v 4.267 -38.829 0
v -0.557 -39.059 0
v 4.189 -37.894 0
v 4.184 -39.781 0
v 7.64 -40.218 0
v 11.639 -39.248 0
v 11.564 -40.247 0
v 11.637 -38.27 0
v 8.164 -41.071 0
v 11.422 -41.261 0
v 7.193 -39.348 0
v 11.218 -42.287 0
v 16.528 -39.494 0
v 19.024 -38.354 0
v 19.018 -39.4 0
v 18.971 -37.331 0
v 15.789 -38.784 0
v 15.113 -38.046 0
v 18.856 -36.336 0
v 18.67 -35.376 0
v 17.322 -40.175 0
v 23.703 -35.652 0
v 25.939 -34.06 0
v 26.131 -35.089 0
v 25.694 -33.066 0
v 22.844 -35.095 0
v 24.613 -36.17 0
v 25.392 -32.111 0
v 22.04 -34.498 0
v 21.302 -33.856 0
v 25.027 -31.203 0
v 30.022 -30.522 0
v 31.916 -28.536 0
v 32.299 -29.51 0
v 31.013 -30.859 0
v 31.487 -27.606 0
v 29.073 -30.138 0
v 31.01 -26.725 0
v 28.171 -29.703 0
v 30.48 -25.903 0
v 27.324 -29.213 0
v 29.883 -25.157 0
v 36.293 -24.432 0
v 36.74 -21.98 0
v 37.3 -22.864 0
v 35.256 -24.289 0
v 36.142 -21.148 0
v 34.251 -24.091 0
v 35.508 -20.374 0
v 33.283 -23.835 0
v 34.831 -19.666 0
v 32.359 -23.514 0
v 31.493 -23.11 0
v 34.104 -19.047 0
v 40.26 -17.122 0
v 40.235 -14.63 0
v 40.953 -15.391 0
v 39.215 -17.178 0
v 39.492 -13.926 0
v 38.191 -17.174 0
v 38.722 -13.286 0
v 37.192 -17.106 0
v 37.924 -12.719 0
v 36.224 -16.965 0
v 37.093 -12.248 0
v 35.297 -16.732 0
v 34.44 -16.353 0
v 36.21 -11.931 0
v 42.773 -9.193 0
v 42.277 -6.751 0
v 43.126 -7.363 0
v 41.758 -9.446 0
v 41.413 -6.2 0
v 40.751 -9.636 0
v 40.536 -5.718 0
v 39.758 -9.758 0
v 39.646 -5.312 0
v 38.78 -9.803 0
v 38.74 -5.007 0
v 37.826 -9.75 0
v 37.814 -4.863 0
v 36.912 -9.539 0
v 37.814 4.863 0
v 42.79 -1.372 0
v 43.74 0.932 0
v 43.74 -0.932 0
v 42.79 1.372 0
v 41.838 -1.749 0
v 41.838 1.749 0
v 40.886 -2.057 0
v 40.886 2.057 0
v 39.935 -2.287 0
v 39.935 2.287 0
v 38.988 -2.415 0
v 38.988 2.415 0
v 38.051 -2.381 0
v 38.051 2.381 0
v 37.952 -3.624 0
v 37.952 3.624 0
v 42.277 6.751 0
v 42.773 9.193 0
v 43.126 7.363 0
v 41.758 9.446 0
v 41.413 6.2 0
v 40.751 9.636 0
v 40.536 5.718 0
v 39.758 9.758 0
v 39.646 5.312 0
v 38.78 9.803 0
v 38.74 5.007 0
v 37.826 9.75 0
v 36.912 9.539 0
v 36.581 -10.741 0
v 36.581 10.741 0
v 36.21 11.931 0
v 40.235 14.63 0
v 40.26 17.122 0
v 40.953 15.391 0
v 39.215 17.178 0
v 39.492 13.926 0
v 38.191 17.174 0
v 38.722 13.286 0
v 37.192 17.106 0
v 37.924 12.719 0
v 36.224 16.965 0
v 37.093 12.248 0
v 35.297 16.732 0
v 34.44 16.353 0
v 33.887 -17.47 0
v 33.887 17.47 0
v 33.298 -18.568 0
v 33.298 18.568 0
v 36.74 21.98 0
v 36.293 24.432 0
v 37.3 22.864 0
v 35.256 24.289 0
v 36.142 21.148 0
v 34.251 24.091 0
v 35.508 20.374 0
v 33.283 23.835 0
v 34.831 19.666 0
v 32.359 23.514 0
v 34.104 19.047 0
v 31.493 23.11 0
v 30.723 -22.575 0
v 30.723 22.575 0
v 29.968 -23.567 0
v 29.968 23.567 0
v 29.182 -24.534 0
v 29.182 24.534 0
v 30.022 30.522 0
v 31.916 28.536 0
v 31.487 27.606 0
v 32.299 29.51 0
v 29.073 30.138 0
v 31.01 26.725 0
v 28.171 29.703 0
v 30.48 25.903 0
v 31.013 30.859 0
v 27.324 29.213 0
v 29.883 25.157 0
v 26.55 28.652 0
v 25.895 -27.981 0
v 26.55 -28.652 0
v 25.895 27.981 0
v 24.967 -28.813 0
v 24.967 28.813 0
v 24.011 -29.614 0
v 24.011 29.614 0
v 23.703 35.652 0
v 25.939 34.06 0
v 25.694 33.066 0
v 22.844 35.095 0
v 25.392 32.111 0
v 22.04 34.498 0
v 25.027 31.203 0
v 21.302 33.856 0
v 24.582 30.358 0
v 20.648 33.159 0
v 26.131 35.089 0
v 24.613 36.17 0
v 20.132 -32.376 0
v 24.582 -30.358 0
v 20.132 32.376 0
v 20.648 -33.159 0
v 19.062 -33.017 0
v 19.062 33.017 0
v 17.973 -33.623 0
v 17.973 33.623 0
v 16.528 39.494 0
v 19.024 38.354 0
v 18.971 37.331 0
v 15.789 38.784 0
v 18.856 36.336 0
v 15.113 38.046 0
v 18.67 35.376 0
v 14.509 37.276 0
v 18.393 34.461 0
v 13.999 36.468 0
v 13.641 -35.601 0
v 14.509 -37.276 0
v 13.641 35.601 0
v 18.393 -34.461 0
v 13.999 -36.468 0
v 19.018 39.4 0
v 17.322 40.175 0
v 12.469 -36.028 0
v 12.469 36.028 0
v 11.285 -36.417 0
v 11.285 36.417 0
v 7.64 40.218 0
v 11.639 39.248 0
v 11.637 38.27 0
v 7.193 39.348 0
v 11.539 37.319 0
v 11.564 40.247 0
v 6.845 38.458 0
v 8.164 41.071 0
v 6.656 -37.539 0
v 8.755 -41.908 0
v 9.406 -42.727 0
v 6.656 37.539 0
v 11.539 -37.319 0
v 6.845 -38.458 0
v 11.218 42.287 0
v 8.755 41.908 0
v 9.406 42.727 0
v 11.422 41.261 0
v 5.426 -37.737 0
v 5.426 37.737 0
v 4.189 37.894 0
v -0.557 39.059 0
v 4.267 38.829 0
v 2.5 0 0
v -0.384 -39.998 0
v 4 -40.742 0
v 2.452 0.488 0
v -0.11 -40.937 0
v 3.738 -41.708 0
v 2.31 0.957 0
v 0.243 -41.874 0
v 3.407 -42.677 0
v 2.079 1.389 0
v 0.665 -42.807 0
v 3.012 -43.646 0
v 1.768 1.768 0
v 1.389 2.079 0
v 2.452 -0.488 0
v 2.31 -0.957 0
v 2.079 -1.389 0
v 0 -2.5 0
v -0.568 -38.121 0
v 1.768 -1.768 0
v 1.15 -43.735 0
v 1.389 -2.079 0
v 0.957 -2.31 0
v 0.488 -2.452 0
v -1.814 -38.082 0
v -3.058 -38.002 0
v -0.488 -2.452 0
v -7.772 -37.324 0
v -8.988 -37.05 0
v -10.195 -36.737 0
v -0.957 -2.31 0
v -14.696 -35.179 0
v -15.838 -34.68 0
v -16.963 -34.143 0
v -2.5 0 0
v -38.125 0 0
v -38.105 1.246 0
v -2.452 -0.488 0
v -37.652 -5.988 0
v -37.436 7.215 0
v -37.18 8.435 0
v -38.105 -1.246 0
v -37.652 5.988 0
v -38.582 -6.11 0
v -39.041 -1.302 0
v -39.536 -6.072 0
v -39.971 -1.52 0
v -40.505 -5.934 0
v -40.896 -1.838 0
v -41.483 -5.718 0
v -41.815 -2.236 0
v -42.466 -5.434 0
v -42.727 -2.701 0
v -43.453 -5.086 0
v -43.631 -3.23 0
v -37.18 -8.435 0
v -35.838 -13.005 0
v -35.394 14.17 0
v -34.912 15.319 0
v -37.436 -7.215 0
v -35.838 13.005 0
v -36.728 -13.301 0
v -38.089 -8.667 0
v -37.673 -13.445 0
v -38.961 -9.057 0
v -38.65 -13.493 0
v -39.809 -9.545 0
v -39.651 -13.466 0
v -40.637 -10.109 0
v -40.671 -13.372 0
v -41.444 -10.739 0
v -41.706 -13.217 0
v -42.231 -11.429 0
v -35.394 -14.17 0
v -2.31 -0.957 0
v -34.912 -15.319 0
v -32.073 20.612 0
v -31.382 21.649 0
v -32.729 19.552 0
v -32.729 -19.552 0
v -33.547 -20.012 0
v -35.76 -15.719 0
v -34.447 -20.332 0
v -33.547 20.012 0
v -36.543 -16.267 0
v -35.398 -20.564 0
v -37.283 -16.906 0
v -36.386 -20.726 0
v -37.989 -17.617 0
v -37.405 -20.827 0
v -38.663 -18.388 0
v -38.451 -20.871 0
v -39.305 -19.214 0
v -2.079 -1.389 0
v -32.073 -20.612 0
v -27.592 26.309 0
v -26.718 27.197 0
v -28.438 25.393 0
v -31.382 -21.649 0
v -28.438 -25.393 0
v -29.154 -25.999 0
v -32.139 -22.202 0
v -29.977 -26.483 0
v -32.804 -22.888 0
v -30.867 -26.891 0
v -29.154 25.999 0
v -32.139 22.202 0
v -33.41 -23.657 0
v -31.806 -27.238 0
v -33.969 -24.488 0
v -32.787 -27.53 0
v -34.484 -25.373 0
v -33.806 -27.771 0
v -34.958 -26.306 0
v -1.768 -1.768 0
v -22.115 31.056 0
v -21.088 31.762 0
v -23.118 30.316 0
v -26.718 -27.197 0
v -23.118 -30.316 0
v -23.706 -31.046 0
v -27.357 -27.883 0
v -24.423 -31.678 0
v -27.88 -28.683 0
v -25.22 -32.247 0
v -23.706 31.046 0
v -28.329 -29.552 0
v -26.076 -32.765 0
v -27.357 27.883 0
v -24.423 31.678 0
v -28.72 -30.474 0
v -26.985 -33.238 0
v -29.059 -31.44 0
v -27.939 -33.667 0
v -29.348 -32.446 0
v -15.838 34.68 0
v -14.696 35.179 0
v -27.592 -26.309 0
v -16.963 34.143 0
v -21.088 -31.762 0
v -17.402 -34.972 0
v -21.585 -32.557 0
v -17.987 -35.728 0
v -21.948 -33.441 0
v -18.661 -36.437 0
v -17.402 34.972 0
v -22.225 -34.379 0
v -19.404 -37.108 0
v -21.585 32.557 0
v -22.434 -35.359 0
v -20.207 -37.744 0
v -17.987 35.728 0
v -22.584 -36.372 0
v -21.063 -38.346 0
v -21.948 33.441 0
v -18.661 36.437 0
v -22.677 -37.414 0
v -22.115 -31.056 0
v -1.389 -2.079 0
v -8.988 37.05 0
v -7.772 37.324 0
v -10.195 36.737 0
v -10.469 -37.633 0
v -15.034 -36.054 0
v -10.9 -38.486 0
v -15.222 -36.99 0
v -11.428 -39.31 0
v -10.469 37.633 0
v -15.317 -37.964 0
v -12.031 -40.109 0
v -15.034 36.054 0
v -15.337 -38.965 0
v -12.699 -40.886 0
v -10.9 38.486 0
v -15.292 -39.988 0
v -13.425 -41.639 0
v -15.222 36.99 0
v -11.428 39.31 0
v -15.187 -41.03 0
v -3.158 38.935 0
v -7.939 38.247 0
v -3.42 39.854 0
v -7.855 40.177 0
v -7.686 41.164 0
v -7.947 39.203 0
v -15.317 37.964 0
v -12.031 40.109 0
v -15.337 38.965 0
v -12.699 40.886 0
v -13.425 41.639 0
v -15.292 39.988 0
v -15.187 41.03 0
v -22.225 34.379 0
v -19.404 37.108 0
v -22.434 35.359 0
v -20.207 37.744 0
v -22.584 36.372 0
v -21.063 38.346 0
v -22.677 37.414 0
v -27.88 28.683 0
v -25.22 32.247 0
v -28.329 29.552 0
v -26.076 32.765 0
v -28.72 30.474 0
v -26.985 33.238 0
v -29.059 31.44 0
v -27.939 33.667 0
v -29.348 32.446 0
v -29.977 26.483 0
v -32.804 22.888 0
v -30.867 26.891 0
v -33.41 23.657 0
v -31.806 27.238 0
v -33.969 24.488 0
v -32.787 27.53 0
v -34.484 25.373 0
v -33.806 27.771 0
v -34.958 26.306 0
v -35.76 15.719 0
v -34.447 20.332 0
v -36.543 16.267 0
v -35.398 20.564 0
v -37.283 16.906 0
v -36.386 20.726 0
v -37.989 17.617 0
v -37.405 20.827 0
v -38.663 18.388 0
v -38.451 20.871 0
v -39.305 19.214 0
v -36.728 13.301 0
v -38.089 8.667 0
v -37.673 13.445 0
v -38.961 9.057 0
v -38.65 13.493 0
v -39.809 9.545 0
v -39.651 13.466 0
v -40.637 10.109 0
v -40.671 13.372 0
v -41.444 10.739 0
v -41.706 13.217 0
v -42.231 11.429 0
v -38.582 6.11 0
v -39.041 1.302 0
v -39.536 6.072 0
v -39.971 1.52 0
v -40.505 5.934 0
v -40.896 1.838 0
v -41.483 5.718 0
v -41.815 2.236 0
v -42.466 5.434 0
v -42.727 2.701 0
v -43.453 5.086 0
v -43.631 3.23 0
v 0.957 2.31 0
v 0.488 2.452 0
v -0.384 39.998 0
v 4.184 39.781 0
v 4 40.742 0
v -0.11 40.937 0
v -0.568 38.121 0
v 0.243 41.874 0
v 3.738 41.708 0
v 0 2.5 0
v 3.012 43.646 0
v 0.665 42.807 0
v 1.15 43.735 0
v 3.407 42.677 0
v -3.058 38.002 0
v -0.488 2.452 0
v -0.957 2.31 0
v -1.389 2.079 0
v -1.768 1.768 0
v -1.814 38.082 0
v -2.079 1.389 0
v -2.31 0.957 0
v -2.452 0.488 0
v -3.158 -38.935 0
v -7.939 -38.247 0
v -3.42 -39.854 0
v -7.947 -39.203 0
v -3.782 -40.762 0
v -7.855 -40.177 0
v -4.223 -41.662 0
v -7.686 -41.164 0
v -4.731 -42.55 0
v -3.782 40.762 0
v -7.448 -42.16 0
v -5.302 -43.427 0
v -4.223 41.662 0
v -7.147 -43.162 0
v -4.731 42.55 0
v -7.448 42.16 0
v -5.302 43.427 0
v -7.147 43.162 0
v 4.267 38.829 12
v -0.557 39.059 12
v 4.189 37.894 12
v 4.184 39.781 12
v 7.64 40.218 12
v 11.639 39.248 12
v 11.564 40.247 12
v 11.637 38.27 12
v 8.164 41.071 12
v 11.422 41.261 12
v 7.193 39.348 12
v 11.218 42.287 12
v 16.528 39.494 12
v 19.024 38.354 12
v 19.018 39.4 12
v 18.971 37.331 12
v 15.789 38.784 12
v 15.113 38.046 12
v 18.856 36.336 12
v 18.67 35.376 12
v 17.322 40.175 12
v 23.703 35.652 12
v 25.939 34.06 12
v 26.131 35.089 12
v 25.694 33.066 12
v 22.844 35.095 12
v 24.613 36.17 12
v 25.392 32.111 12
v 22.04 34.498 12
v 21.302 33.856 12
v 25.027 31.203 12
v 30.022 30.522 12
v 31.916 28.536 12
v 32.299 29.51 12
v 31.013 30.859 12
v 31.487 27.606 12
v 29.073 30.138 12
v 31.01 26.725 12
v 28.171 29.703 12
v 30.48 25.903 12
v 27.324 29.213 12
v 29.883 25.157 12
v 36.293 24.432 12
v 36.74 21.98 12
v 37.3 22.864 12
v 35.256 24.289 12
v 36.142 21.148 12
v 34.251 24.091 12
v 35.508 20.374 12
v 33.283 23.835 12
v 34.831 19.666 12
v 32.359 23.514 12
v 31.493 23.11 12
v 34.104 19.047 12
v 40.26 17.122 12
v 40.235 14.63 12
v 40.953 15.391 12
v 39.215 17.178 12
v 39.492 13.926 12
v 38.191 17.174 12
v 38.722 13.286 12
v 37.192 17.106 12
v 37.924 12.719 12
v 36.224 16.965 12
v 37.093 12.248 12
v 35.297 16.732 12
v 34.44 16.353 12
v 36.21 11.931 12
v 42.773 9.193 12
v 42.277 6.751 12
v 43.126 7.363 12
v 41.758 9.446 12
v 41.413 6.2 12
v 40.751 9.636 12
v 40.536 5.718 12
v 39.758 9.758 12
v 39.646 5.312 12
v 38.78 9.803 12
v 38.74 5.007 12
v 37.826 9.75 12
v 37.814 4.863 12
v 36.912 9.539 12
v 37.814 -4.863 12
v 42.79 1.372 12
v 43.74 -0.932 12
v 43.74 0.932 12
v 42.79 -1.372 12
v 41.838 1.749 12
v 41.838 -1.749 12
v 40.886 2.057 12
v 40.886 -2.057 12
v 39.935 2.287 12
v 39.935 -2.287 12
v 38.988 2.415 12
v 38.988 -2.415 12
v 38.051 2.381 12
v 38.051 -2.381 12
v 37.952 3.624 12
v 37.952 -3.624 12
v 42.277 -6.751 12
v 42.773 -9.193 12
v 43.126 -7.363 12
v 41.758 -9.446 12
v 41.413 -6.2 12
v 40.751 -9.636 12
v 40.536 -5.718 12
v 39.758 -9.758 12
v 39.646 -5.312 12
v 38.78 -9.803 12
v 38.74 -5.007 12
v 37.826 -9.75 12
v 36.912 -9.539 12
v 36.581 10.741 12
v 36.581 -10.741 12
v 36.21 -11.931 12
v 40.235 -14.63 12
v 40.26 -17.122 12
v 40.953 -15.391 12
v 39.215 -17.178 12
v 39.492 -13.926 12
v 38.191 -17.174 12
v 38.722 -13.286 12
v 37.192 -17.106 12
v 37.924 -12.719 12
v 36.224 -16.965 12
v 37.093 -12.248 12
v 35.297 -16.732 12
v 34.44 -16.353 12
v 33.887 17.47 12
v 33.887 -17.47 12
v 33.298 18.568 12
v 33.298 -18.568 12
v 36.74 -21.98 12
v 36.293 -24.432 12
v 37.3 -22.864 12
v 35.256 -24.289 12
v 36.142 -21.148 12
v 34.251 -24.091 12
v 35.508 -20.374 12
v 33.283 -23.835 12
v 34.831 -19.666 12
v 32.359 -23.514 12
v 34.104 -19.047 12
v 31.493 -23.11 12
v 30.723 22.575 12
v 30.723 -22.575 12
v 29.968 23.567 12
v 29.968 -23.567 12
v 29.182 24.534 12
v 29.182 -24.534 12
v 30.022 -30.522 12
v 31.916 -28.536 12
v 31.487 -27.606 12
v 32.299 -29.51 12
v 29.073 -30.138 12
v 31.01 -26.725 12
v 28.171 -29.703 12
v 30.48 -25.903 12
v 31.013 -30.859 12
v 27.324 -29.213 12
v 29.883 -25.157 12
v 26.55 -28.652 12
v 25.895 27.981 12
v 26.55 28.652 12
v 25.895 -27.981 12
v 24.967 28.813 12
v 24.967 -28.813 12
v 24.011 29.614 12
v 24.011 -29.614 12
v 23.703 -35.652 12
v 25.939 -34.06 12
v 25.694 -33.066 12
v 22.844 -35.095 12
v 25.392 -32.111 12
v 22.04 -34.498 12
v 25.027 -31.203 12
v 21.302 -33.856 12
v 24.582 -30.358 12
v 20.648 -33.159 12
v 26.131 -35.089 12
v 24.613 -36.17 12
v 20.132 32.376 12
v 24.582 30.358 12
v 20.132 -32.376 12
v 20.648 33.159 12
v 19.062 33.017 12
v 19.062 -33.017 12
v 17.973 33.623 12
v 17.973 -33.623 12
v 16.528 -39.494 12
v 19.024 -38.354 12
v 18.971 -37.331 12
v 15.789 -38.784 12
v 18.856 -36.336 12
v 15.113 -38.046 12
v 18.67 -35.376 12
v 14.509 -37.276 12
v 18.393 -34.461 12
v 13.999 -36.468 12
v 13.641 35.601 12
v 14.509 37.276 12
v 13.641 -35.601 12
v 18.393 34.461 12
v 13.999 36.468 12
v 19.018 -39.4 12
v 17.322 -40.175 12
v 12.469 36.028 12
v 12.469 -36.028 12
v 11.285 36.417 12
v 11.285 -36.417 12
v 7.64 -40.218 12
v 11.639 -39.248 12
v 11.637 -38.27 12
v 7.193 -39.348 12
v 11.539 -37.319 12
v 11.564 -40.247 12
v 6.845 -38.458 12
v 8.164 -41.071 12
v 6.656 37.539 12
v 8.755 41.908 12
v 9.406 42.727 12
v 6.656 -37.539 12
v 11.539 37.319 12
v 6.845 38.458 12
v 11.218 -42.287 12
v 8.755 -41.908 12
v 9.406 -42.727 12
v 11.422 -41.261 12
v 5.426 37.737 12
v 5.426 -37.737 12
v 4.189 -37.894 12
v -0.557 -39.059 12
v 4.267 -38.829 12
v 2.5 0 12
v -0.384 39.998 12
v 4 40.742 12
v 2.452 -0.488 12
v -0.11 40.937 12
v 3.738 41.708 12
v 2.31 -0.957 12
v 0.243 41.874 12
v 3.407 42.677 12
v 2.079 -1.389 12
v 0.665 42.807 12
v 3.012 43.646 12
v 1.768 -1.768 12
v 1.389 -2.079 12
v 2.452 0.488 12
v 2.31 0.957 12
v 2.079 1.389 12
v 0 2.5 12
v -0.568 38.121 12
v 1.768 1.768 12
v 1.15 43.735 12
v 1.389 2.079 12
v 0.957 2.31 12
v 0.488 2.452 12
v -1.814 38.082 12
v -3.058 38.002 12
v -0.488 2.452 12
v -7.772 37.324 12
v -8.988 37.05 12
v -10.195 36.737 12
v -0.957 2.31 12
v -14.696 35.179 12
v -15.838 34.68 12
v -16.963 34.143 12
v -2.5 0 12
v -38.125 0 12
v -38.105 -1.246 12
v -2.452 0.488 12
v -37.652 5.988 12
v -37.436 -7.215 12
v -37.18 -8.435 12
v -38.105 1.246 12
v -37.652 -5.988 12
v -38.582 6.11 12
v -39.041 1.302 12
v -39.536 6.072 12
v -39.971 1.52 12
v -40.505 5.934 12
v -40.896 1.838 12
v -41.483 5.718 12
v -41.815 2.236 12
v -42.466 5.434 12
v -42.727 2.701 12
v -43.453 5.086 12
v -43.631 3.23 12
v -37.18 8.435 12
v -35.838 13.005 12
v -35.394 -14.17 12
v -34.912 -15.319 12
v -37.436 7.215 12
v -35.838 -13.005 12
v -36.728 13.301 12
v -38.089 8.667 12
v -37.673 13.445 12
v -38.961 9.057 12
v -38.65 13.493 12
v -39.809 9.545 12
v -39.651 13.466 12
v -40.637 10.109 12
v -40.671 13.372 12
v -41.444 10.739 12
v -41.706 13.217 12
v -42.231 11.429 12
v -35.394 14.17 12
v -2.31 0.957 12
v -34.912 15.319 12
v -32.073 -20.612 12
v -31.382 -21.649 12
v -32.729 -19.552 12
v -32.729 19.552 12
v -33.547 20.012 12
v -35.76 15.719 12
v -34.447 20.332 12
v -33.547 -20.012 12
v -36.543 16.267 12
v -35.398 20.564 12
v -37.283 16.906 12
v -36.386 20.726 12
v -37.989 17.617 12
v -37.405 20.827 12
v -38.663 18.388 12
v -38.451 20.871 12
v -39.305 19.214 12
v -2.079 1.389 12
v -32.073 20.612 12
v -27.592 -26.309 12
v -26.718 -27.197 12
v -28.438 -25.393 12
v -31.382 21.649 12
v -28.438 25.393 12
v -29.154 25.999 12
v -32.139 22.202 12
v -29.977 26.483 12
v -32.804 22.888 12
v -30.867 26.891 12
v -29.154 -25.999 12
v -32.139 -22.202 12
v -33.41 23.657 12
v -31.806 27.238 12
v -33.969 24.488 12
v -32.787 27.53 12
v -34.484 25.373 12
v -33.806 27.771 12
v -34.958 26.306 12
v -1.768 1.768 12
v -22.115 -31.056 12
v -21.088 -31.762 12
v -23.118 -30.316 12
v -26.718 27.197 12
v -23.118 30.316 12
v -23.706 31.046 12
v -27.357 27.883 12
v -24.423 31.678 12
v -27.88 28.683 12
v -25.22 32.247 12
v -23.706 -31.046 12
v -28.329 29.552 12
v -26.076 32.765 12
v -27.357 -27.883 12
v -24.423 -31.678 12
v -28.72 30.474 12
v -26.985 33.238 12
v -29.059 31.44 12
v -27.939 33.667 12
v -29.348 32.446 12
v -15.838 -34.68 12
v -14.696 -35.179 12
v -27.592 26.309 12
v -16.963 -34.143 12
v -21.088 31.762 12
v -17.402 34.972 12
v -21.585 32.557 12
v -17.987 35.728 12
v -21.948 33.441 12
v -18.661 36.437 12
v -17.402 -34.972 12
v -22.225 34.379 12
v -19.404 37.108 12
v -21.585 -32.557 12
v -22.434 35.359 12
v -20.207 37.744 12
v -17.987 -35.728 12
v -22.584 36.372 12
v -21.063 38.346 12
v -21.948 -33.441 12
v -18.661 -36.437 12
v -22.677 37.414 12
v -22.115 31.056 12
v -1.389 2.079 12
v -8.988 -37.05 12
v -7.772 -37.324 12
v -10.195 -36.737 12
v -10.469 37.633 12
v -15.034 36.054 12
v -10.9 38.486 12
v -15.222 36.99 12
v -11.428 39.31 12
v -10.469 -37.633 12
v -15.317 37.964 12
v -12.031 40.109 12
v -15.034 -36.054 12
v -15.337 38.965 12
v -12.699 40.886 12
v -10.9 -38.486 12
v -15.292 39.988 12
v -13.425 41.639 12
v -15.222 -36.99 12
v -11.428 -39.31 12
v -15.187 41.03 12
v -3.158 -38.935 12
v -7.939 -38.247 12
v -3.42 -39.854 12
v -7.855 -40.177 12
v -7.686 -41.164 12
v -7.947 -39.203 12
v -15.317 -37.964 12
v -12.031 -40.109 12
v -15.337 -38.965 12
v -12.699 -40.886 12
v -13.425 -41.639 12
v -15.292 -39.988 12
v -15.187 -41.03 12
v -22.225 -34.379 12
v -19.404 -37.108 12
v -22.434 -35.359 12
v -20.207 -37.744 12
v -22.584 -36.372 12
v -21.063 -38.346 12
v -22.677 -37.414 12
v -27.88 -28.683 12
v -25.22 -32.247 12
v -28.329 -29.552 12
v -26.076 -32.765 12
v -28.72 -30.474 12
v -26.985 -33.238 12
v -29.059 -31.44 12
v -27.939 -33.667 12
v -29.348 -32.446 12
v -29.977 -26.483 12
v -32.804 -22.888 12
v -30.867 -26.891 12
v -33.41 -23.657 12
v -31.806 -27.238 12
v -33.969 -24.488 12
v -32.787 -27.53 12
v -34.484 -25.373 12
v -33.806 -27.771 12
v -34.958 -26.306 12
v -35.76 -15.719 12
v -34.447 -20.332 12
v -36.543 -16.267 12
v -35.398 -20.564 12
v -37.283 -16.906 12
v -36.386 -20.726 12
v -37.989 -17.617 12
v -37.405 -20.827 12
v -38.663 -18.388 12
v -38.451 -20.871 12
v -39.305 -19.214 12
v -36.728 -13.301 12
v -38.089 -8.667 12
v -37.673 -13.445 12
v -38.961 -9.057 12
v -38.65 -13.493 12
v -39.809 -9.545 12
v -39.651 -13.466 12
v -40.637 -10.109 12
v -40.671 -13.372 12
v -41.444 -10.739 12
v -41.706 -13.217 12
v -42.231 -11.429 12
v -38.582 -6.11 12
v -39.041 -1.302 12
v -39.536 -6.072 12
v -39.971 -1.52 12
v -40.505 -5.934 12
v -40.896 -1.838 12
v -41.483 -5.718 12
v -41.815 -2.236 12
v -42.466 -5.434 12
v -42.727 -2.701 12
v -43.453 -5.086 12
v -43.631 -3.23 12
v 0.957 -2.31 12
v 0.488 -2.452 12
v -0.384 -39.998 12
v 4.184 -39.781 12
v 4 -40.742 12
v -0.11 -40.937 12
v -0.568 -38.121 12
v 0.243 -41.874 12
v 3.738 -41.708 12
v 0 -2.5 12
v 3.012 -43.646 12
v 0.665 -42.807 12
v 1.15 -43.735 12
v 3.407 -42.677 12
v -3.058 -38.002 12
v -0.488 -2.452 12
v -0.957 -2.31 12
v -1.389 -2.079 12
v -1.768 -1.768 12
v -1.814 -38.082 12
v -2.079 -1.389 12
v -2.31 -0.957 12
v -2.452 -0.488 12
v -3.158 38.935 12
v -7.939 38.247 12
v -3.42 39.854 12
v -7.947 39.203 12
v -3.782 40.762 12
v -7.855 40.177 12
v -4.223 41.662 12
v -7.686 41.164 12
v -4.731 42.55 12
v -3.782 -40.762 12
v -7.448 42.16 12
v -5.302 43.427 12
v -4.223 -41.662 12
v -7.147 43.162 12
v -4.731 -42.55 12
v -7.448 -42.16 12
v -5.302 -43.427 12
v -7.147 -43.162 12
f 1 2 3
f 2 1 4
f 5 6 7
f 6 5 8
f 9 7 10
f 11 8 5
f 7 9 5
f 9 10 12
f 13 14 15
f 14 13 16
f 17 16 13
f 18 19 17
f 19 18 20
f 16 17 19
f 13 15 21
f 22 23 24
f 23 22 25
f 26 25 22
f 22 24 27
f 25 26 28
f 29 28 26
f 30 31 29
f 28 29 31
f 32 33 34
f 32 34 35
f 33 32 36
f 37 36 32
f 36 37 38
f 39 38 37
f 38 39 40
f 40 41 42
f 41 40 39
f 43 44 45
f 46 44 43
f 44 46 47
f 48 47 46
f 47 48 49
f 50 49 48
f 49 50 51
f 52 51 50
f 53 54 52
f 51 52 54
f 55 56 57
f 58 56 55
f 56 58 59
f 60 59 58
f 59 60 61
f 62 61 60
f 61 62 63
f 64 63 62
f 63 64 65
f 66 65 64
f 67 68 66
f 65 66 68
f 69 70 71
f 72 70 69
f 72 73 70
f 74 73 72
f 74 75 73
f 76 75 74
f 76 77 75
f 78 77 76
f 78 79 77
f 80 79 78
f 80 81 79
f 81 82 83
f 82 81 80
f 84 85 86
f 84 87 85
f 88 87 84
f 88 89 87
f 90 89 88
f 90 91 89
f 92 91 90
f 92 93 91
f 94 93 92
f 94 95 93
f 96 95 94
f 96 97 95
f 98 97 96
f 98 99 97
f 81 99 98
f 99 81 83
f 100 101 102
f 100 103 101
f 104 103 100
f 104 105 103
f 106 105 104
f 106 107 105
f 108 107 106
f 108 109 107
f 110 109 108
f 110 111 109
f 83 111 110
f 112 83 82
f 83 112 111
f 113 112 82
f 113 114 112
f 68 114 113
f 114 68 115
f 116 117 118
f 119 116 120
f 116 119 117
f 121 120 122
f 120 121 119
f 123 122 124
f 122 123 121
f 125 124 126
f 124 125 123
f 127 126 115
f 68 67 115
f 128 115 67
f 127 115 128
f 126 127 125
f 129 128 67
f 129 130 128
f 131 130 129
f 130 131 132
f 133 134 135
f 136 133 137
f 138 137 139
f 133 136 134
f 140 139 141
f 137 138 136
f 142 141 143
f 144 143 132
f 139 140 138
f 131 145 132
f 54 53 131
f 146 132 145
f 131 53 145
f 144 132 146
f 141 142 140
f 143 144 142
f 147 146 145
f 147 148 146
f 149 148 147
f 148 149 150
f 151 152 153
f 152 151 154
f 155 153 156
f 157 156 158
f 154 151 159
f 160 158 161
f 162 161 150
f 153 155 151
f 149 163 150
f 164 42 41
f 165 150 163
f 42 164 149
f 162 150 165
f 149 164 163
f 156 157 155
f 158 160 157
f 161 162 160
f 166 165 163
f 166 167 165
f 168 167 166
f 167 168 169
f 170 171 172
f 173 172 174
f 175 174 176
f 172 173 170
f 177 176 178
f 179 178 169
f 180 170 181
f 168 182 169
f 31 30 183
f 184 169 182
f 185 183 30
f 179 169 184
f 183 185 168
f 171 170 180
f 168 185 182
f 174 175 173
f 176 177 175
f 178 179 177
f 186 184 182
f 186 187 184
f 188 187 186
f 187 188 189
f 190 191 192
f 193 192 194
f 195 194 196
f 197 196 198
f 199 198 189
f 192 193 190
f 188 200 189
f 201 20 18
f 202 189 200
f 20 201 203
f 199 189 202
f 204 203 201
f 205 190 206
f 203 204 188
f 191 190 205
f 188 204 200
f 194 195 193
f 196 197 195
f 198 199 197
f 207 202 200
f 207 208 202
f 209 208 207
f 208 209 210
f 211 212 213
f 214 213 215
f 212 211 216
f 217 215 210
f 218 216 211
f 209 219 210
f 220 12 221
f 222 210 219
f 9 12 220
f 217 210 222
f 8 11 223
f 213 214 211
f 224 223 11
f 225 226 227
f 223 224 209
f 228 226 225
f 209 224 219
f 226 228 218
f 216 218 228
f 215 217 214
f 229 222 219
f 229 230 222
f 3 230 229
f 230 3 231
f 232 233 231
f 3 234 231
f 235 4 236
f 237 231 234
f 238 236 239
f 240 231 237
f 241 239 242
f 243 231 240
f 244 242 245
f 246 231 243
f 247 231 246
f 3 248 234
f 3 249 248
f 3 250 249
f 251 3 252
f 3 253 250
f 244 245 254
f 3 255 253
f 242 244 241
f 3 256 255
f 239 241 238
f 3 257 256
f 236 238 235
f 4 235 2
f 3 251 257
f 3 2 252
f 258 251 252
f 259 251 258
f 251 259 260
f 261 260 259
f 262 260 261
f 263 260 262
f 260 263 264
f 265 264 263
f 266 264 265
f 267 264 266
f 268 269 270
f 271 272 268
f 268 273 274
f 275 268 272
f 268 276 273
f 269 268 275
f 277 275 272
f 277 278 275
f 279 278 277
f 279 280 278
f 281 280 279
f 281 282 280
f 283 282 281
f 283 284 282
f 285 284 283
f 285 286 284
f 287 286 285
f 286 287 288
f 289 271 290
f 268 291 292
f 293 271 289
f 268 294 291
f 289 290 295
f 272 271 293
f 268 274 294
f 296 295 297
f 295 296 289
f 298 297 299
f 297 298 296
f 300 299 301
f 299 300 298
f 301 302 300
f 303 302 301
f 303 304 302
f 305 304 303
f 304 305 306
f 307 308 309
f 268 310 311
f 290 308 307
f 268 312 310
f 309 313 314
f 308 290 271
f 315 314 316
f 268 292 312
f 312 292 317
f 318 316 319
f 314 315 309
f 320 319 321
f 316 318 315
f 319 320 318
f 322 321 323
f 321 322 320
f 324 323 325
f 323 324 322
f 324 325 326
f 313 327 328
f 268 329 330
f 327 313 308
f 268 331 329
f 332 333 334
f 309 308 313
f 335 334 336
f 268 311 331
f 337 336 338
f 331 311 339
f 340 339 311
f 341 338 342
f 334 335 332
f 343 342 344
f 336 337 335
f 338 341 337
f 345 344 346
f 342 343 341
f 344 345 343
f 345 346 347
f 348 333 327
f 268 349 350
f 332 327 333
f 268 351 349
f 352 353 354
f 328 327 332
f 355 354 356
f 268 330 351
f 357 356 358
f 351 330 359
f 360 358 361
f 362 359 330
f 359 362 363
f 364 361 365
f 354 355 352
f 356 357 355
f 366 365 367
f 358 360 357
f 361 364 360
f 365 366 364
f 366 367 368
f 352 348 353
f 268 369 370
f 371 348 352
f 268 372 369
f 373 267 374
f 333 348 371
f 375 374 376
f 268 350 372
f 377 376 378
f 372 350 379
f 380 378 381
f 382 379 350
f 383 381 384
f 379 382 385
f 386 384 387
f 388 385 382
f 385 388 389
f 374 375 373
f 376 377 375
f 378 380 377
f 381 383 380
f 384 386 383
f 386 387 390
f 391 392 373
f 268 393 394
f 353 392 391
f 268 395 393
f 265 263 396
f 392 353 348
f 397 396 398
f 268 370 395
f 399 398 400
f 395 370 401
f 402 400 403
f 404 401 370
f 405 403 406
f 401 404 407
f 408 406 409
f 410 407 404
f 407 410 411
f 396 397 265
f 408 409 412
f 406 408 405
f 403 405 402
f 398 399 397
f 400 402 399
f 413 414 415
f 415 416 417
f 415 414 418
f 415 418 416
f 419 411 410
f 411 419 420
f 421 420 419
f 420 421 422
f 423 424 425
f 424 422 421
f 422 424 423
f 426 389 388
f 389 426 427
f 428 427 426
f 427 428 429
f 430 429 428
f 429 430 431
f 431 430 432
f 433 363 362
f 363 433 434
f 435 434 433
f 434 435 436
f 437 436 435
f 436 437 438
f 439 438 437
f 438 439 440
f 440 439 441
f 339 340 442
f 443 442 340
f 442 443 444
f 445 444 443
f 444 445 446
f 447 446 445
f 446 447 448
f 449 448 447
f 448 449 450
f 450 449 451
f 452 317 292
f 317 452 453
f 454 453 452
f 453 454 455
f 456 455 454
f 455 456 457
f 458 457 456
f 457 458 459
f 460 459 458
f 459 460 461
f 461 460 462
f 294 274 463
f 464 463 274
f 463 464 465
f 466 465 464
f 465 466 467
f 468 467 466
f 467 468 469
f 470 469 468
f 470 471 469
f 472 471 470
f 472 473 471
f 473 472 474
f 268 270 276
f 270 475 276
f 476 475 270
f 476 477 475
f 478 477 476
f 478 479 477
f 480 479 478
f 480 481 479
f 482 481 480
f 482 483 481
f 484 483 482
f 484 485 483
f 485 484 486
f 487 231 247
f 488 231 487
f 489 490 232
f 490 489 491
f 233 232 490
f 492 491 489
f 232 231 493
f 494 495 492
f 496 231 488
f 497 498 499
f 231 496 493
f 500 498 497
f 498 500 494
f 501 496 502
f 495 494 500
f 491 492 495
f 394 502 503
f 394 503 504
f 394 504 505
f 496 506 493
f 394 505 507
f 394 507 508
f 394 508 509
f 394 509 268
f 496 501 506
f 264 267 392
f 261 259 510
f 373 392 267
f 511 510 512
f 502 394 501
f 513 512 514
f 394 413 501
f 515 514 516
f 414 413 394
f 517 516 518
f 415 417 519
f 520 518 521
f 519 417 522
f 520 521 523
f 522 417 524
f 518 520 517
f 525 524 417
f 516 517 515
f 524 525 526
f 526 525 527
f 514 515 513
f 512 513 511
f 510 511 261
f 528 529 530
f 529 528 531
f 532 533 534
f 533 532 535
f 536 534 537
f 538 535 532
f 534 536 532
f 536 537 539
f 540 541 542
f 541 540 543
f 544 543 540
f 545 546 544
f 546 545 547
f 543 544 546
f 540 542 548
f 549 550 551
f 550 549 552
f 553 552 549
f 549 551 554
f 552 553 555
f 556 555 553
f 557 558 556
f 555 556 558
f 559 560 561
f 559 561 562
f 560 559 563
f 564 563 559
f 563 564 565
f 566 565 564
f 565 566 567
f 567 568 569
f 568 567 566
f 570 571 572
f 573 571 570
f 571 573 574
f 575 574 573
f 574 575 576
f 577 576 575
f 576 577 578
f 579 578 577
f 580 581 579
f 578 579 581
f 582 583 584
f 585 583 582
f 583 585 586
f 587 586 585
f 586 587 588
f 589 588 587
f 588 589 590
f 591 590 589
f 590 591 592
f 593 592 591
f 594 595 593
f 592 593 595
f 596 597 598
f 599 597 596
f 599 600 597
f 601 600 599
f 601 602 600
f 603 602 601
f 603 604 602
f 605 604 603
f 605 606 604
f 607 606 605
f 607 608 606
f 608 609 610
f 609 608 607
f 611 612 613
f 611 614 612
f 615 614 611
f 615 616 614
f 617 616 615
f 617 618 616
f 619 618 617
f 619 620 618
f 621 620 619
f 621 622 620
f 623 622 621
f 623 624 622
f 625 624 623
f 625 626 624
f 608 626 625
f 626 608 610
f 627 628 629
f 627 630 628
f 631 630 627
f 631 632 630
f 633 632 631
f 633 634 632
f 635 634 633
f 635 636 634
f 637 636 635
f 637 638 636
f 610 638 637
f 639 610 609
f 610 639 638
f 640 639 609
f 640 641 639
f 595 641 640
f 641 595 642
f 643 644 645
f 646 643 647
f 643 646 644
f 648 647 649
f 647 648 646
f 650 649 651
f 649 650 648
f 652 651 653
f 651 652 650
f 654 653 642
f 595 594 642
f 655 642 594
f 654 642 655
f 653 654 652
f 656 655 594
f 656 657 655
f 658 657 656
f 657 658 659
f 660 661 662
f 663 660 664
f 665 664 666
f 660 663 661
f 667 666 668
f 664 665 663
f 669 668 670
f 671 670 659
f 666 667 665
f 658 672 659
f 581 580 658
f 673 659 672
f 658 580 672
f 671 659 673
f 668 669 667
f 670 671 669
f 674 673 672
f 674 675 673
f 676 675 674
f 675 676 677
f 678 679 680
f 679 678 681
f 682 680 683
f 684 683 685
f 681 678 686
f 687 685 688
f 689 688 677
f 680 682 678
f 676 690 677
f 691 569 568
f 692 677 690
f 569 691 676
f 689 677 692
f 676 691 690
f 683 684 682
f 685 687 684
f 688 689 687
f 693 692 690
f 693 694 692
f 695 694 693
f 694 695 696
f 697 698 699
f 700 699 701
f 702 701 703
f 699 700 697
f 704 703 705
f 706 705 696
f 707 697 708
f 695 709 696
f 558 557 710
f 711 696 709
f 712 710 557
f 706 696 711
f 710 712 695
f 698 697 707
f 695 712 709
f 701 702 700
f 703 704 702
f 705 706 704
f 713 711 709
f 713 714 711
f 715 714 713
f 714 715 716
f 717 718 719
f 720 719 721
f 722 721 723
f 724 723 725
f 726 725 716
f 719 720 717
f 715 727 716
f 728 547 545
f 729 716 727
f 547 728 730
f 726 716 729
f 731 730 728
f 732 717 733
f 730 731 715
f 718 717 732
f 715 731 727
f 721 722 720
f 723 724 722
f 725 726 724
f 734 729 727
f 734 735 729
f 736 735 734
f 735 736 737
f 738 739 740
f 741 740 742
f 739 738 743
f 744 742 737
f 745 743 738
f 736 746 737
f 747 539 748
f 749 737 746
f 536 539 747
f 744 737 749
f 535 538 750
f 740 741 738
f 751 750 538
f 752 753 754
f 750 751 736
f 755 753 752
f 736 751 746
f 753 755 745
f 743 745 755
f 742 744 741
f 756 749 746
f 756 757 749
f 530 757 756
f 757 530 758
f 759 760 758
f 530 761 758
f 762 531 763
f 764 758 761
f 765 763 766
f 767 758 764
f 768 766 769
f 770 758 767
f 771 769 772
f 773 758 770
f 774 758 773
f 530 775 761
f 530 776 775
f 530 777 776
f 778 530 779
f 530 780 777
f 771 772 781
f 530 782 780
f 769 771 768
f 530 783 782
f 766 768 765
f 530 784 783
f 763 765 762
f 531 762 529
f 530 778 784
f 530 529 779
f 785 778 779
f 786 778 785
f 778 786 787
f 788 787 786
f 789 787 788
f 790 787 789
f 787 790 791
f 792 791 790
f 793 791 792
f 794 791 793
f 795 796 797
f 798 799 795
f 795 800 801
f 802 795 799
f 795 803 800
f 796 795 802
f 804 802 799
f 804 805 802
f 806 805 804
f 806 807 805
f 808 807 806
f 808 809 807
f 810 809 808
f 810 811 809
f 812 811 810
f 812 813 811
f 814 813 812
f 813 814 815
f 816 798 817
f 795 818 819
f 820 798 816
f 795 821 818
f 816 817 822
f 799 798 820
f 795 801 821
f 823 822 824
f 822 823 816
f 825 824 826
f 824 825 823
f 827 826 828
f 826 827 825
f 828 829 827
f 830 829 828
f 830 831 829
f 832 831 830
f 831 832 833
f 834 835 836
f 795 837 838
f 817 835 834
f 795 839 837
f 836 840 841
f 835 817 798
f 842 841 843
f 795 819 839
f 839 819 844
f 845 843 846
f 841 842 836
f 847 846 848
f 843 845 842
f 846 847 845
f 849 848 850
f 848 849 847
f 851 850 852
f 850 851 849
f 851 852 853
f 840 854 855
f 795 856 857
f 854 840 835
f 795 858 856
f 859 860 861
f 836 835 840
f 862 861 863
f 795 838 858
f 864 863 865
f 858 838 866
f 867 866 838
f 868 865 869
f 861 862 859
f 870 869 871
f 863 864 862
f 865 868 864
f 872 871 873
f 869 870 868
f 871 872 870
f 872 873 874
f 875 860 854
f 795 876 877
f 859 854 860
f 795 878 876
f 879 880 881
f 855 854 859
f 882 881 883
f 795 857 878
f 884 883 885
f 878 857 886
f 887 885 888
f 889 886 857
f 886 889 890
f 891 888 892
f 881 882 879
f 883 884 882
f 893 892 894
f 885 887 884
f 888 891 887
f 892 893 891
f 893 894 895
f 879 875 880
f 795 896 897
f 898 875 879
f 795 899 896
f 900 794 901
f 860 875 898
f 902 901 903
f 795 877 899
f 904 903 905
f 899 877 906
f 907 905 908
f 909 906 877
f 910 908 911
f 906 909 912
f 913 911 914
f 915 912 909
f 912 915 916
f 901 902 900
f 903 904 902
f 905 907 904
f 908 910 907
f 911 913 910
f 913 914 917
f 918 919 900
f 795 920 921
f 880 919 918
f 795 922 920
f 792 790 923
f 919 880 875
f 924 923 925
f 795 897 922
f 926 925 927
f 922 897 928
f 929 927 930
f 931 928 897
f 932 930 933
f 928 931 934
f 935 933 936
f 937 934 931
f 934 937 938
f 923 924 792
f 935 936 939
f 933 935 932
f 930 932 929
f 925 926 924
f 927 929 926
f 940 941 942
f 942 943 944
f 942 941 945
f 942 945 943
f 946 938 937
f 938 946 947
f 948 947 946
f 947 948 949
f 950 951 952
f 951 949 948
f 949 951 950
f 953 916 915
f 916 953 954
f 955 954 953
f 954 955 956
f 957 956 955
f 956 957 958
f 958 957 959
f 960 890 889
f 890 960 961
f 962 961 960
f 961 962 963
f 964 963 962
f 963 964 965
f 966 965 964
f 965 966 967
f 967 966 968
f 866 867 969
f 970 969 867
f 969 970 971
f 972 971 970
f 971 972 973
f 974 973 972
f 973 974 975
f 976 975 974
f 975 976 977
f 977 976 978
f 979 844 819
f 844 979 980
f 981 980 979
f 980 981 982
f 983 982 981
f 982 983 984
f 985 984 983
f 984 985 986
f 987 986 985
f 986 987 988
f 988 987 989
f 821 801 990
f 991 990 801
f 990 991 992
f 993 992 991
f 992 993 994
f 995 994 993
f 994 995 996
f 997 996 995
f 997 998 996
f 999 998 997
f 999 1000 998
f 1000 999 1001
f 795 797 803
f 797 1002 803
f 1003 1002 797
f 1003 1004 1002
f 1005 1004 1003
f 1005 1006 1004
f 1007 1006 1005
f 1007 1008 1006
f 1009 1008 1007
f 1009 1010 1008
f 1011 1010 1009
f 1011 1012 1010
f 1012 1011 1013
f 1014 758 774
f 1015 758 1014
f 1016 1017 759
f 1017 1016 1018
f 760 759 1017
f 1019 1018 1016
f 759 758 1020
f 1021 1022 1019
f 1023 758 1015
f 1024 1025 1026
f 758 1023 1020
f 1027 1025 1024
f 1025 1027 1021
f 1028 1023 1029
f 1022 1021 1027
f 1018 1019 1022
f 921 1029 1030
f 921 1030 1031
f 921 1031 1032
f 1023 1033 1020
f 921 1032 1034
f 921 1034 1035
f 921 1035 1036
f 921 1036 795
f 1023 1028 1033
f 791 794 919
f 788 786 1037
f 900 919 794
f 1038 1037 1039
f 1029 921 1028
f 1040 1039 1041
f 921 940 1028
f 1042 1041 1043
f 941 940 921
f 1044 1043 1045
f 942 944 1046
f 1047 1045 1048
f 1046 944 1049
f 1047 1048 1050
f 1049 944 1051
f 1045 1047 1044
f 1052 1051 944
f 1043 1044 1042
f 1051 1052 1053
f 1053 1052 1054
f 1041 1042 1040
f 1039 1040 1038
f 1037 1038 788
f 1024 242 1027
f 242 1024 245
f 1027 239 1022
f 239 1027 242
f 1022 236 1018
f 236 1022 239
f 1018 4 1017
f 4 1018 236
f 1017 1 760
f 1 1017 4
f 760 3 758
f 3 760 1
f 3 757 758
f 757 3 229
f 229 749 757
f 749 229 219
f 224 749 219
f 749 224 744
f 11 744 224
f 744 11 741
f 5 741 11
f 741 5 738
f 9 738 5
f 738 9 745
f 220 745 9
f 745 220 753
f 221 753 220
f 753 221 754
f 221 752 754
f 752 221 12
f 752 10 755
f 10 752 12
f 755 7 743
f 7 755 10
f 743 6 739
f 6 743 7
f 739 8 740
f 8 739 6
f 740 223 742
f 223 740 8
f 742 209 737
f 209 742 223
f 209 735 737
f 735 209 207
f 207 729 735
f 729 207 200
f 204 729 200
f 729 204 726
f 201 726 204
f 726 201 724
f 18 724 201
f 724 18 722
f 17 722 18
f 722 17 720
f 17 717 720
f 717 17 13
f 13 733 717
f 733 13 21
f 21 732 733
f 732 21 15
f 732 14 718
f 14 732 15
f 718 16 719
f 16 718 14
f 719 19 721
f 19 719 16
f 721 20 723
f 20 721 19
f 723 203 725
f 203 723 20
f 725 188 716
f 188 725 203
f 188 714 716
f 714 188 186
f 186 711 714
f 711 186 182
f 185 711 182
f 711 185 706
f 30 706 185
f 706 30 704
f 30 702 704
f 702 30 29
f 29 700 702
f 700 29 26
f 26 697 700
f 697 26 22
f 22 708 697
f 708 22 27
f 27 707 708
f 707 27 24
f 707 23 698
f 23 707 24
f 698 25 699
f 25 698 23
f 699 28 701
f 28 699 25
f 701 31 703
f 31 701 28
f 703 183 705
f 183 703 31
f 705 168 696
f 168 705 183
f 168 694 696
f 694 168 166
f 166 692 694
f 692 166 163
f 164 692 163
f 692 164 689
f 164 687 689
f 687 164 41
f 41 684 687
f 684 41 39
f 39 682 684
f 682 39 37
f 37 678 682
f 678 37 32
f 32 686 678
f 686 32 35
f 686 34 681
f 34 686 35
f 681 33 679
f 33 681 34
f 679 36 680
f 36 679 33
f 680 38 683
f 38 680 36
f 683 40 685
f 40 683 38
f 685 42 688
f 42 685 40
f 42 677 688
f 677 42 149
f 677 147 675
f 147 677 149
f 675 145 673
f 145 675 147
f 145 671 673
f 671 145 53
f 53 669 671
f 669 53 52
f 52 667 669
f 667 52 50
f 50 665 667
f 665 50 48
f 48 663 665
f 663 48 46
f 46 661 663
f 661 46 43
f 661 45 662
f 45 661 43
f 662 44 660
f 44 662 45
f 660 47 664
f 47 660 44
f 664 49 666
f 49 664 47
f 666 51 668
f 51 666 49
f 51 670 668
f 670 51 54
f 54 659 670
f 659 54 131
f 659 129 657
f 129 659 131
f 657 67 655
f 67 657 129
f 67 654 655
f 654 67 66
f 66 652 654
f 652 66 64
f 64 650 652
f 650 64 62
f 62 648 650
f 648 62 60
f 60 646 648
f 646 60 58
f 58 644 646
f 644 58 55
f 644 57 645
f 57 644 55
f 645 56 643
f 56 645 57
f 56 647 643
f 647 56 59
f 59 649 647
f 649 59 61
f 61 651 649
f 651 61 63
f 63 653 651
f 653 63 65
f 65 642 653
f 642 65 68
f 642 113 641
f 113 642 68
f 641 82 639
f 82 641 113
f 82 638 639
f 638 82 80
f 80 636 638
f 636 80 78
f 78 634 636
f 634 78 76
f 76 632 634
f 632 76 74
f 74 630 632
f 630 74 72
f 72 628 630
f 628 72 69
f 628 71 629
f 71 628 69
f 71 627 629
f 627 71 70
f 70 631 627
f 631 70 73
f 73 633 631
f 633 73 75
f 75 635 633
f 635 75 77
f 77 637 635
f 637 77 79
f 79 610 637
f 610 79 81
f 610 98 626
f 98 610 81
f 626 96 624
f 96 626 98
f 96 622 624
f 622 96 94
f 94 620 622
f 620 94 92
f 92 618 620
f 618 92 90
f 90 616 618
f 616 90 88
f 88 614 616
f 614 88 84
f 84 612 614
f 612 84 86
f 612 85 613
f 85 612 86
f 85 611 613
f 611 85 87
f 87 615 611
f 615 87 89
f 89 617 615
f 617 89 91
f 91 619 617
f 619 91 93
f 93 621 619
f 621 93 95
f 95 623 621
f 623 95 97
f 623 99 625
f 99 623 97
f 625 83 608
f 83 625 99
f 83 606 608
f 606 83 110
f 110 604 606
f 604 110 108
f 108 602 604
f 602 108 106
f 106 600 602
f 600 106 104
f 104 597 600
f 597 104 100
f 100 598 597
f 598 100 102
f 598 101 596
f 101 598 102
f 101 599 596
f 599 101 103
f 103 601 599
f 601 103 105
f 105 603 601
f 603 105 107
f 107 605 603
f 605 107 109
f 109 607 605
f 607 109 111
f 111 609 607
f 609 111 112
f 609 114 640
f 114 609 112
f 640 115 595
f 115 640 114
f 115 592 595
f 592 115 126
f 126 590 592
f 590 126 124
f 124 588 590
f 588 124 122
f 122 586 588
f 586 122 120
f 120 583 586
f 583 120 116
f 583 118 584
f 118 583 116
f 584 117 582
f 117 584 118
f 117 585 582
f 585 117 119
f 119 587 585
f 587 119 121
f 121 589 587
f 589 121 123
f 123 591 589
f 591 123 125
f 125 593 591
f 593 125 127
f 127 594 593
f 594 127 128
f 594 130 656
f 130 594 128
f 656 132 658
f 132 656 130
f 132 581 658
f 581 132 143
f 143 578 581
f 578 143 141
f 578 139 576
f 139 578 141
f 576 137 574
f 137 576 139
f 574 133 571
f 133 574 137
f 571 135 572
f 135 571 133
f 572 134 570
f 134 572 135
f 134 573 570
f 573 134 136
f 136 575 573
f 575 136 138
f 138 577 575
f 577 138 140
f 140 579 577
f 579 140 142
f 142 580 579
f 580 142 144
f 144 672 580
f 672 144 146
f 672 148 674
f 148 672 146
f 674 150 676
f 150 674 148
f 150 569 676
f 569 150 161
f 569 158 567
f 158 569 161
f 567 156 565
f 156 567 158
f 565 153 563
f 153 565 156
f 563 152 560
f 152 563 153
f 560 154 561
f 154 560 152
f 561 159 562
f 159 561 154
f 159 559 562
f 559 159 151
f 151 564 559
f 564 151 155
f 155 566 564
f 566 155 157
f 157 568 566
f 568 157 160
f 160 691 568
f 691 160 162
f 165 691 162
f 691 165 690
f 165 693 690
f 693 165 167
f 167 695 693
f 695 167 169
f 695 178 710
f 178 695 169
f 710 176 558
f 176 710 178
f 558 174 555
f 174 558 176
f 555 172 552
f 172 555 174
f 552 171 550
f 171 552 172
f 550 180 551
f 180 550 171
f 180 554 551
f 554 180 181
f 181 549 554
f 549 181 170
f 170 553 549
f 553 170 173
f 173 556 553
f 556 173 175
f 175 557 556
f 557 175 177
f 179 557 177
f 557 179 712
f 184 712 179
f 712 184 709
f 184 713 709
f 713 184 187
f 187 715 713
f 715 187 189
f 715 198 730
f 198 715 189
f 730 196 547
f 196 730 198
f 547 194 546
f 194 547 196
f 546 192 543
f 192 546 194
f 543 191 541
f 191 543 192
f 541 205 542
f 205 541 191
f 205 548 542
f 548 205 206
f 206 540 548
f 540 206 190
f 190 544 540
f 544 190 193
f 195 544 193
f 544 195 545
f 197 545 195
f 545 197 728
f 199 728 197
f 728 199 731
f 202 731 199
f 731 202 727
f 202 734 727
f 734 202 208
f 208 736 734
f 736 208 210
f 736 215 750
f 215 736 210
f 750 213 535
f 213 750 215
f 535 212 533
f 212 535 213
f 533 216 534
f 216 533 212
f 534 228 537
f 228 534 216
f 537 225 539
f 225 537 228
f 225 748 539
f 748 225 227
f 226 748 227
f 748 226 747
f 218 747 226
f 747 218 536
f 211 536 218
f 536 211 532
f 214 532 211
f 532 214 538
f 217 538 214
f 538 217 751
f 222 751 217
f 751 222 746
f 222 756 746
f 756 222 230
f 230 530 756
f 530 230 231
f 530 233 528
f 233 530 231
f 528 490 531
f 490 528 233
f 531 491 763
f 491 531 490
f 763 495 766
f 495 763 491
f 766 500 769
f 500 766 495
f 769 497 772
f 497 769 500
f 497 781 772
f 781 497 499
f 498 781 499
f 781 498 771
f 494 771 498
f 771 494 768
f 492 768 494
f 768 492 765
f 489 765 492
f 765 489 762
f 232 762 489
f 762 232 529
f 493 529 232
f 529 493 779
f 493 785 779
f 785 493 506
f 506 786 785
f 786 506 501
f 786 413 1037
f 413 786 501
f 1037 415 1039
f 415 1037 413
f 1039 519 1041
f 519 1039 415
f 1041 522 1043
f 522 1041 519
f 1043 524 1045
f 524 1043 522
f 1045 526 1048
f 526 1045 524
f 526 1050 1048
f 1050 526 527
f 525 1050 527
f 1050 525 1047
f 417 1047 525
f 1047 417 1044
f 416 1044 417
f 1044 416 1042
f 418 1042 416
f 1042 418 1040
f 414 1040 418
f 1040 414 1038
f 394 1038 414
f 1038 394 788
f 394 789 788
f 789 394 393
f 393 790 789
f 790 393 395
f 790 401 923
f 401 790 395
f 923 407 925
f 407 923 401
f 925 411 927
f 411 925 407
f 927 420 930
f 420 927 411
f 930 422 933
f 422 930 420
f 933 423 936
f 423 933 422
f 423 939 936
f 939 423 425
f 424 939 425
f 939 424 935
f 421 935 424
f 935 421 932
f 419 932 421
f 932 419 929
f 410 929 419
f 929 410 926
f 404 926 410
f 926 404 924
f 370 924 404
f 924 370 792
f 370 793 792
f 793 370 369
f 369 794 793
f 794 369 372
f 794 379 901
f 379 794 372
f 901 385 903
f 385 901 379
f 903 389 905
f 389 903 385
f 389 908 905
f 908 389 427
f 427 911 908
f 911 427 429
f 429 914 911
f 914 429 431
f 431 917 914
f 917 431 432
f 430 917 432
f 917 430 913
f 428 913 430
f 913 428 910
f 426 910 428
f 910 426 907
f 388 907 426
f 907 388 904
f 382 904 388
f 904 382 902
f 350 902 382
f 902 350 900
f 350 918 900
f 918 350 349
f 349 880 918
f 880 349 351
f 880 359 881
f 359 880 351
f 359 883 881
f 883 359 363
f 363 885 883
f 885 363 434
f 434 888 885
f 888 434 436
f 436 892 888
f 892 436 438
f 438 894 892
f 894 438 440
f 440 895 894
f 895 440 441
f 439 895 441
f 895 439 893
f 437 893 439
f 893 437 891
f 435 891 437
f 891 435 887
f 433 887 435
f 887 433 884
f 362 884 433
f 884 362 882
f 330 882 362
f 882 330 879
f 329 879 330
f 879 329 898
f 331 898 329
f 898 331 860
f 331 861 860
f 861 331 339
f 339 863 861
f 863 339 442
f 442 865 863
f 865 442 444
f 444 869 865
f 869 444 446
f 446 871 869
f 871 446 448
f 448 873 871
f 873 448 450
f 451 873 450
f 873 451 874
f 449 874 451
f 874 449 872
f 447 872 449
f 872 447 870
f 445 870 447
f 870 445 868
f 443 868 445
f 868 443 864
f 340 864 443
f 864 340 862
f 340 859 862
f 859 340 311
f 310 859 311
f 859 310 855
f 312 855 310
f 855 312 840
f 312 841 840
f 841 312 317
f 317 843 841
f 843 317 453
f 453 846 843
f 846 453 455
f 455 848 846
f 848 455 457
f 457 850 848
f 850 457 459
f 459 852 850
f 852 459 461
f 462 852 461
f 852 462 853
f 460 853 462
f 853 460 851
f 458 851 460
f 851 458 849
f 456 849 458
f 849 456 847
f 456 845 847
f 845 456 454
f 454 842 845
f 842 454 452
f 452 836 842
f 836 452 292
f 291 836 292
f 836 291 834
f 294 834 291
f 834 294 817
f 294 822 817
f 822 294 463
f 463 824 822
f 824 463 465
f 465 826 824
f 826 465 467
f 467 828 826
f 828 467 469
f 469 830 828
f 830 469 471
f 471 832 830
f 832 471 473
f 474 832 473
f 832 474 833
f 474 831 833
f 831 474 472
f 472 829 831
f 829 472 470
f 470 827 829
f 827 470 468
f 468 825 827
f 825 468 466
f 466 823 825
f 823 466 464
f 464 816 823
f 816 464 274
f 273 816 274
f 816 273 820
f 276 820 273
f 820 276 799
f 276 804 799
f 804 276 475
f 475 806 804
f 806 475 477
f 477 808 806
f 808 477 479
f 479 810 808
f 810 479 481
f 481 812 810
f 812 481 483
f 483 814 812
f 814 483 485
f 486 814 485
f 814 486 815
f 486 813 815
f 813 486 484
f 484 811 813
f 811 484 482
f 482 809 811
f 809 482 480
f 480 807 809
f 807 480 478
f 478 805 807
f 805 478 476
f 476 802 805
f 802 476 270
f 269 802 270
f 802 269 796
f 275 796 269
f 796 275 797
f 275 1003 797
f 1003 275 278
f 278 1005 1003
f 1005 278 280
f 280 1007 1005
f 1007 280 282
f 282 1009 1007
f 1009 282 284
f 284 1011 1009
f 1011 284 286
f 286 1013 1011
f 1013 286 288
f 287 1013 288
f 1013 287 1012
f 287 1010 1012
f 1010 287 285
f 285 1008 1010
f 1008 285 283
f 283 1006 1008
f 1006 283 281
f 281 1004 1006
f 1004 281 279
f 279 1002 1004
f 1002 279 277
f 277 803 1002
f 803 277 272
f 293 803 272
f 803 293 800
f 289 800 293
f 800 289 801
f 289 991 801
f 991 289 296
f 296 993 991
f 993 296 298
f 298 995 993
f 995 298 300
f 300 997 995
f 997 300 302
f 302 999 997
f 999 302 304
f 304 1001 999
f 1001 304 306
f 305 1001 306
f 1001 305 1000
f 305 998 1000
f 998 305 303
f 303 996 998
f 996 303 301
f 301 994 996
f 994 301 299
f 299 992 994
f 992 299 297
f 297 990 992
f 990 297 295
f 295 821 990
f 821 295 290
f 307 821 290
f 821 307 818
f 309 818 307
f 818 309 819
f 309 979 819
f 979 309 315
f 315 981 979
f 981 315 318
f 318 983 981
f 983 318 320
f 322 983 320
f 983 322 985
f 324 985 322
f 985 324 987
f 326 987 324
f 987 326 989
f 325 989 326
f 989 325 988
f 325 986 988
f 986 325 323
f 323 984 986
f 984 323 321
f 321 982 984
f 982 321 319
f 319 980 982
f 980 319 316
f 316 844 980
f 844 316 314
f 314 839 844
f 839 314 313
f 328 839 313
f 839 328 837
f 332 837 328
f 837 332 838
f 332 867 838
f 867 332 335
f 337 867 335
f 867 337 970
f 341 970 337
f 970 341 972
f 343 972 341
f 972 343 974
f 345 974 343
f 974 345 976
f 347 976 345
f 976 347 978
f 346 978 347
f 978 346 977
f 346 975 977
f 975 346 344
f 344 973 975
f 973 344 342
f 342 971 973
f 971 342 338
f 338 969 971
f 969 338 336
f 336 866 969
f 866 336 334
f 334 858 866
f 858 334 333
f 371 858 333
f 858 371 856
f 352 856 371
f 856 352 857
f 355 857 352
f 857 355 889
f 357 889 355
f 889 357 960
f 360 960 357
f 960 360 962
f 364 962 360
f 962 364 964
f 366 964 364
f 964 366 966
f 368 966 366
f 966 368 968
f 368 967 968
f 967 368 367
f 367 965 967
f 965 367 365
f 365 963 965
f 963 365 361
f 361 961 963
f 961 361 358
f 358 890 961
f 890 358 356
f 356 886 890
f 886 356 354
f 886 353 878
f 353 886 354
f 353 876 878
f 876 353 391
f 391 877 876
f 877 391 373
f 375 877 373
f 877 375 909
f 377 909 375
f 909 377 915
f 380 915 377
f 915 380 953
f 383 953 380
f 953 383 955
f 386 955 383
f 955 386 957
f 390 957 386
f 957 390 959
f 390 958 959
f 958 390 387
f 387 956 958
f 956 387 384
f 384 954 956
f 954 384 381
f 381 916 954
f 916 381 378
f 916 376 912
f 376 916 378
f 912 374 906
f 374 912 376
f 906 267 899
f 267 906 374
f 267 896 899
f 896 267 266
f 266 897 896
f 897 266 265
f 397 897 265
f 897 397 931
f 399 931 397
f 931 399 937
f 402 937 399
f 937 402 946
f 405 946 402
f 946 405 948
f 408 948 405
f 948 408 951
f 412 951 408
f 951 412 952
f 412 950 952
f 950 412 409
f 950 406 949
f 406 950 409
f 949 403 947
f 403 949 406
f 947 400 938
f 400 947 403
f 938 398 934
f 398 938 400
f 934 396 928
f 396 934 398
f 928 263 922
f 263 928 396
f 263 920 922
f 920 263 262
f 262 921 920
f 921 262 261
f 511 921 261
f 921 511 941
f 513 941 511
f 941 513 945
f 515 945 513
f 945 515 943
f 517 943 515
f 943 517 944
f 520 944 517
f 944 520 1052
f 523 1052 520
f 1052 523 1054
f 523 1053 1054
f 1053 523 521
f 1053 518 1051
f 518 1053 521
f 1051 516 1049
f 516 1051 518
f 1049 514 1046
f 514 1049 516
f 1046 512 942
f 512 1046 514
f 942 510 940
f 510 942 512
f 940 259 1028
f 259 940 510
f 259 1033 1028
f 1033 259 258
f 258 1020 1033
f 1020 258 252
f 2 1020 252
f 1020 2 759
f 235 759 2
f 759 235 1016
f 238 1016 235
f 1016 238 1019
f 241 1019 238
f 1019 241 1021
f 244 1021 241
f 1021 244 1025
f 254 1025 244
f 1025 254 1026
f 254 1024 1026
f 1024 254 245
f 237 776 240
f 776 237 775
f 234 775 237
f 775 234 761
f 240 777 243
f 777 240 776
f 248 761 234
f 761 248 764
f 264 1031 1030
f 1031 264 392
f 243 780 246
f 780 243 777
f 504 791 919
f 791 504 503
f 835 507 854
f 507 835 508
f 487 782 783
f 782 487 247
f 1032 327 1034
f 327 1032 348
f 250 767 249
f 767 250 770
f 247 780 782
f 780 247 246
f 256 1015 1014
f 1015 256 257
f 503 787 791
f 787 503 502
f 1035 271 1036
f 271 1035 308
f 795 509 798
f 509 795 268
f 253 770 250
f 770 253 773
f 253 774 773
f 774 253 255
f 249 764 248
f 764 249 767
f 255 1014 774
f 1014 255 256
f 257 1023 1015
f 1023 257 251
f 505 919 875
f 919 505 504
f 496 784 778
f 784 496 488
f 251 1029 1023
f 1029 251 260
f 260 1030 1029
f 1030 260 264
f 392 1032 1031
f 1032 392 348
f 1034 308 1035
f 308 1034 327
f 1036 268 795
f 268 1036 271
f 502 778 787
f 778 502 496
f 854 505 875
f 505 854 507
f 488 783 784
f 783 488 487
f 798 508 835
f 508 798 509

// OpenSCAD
$fn = 32;

// ----------------------------------------------------------------------
// Spur gear: m=2.5 z=33, 87.5 mm tip diameter x 12 mm
// ----------------------------------------------------------------------

// --- parameters (mm) ---
gear_module = 2.5;        // module
tooth_count = 33;         // number of teeth
gear_w = 12;              // face width
pa = 20;                  // pressure angle, deg
bore = 5;                 // shaft bore

/* --- involute profile --- */
pitch_r = gear_module * tooth_count / 2;
base_r = pitch_r * cos(pa);
tip_r = pitch_r + gear_module;
root_r = pitch_r - 1.25 * gear_module;
flank_steps = 6;

function inv_deg(a) = (tan(a) - a * PI / 180) * 180 / PI;
function flank_r(i) = root_r + (tip_r - root_r) * i / flank_steps;
function half_angle(r) = 90 / tooth_count + inv_deg(pa) - inv_deg(acos(min(1, base_r / r)));
function tooth_pt(k, i, side) =
    let (r = flank_r(i), a = k * 360 / tooth_count + side * half_angle(r))
    [r * cos(a), r * sin(a)];

module tooth_profile() {
  polygon(points = [
    for (k = [0 : tooth_count - 1])
      each [
        for (i = [0 : flank_steps]) tooth_pt(k, i, -1),
        for (i = [flank_steps : -1 : 0]) tooth_pt(k, i, 1),
        let (ta = (k + 0.5) * 360 / tooth_count)
          [root_r * cos(ta), root_r * sin(ta)]
      ]
  ]);
}

module gear_disc() {
  linear_extrude(height = gear_w) tooth_profile();
}

difference() {
  gear_disc();
  translate([0, 0, -1]) cylinder(h = gear_w + 3, d = bore);
}
